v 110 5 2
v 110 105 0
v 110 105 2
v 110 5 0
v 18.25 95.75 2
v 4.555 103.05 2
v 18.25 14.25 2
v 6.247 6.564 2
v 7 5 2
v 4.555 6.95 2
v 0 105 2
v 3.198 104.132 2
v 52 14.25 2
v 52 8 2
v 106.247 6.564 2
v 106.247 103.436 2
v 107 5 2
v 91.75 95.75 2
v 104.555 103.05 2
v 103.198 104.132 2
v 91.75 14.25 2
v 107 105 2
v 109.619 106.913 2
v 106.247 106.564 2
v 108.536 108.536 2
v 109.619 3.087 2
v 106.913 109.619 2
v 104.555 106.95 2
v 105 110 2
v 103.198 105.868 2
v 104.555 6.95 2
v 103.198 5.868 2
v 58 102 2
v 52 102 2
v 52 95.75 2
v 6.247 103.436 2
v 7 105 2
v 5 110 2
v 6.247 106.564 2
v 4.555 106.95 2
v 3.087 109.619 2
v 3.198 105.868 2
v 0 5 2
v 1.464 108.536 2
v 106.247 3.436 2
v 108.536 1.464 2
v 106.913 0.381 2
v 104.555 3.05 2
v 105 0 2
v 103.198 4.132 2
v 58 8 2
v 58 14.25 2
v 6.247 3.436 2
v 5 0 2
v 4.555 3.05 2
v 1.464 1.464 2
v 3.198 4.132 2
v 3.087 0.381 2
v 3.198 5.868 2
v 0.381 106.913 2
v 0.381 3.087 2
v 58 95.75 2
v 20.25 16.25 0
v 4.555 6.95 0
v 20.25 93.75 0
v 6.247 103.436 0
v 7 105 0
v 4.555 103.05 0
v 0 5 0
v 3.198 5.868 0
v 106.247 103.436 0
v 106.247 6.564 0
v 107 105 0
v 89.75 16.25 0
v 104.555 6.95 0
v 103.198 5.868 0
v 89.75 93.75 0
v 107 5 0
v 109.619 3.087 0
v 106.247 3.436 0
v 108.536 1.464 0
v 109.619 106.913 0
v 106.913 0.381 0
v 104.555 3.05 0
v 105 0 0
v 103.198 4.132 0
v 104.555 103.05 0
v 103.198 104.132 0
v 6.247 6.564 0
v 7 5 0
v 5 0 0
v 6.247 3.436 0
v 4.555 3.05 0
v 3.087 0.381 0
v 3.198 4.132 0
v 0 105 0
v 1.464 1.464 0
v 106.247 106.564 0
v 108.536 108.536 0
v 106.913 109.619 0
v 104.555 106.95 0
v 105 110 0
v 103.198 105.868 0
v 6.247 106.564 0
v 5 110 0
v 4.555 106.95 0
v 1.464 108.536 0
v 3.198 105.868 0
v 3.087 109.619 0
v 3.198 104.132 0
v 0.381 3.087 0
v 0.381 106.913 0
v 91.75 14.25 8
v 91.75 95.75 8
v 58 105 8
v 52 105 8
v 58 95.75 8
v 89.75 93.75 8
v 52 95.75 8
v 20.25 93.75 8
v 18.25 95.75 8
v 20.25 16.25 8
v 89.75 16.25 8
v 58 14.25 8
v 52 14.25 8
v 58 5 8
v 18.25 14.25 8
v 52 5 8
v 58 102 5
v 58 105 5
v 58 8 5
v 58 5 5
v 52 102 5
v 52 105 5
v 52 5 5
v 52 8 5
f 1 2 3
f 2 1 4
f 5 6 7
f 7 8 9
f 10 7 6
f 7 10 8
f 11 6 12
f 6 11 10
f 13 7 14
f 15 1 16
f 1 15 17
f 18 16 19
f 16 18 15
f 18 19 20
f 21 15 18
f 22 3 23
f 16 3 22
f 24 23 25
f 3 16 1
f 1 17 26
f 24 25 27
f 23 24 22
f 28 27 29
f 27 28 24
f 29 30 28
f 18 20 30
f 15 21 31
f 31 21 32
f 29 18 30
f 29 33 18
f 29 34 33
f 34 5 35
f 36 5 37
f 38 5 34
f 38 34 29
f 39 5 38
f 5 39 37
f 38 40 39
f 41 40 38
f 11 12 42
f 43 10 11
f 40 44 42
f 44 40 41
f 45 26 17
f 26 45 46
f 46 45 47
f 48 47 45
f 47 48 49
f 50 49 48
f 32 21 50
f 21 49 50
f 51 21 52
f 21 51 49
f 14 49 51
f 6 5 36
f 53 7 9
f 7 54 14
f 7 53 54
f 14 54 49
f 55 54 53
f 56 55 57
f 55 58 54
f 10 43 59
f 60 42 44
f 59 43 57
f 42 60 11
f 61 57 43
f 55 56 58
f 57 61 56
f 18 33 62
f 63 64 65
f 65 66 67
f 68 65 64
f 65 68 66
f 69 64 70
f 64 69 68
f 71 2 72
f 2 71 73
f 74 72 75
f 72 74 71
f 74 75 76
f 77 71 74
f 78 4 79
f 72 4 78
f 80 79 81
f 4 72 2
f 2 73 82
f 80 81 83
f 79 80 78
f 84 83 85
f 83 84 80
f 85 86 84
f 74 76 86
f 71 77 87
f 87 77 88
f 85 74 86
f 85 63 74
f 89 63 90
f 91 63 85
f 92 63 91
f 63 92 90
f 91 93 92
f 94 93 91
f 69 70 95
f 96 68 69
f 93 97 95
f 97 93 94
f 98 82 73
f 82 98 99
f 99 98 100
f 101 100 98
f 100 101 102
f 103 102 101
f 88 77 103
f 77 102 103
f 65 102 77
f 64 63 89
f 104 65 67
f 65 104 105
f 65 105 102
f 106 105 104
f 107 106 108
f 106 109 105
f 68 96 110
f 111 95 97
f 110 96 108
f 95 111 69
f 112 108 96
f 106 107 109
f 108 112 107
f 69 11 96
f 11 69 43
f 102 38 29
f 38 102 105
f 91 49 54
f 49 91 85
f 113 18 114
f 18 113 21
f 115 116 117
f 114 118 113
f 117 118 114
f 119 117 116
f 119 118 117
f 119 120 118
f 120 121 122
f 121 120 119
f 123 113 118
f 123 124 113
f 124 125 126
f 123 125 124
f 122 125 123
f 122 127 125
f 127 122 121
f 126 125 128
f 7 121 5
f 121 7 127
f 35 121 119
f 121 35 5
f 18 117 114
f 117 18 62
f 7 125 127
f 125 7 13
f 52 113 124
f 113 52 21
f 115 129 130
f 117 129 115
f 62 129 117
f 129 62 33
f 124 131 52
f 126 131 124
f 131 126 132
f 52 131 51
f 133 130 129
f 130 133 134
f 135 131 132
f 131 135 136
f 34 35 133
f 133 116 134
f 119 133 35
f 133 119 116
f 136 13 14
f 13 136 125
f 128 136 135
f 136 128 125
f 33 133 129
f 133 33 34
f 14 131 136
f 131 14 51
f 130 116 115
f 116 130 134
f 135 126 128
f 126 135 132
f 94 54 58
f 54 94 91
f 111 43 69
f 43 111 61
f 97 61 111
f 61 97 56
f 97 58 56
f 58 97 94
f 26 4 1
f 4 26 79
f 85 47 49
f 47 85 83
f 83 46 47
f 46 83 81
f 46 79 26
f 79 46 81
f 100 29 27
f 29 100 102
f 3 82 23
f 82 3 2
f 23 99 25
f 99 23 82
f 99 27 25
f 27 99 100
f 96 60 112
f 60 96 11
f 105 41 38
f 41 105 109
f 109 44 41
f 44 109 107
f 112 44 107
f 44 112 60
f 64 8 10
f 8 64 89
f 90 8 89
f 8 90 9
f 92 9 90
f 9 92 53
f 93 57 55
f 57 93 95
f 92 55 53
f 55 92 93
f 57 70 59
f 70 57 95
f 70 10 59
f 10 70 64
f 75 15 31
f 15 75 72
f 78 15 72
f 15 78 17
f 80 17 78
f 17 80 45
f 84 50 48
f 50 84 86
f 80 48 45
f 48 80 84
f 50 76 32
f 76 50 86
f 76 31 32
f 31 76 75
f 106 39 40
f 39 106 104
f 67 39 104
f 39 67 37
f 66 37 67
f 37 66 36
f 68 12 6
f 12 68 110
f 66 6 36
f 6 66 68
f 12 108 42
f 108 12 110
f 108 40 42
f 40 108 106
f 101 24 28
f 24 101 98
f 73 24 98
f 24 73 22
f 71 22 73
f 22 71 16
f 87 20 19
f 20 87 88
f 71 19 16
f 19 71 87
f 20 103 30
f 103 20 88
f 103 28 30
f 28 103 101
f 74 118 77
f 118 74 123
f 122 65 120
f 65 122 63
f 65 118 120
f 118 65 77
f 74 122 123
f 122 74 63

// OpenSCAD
wall_strength = 2;
adapter_width = 110;
adapter_length = 110;

cooler_width = 69.5; // nice
cooler_length = 77.5;

corner_radius = 5;
screw_hole_radius = 2;

inner_hook_distance = 94;
hook_width = 6;
outer_hook_distance = 100;

fence_height = 8;

// the whole project consists of two big unions.
// one is all the positives. Base plate, fence and hooks
// the other are the negatives for the big hole in the middle,
// the bore holes and the rounded corners

// change this to union to see how this is build
difference() {
    // positives
    union () {
        // base plate
        cube([
            adapter_length,
            adapter_width,
            wall_strength
        ]);
        translate([
            (adapter_width - cooler_width - 2 * wall_strength) / 2,
            (adapter_length - cooler_length - 2 * wall_strength) / 2,
            0]) {
            
            // fence
            cube([
                cooler_width + 2 * wall_strength, 
                cooler_length + 2 * wall_strength, 
                fence_height
            ]);
        }
        //hook lower part
        translate([
            (adapter_length - hook_width) / 2,
            (adapter_width - inner_hook_distance) / 2,
            0]) {
            color("#ff0000") 
            cube([
                hook_width, 
                inner_hook_distance, 
                3 + wall_strength
            ]);
        }

        // hook upper part
        translate([
            (adapter_length - hook_width) / 2,
            (adapter_width - outer_hook_distance) / 2,
            3 + wall_strength]) {
            color("#ff0000") 
            cube([
                hook_width, 
                outer_hook_distance, 
                3
            ]);
        }
    }
    // positives
    union() {
        // every corner is basically a cube with a quarter-cylindrical cutout
        // which is then used to subtract from a base plate and get a nice round corner
        // TODO: Find if there's some better way to do this.
        translate([-1 * corner_radius ,-1 * corner_radius ,-1 * corner_radius ]) {
            difference () {
                cube ([
                    2 * corner_radius,
                    2 * corner_radius,
                    2 * corner_radius
                ]);
                translate([2 * corner_radius,2 * corner_radius,0]) {
                    cylinder(30,corner_radius,corner_radius);
                }
            }
        }
        translate([
                (corner_radius) + adapter_width ,
                (-1 * corner_radius),
                (-1 * corner_radius) 
                ]) {
            rotate(a = 90, v=[0,0,10]) {
                difference () {
                    cube ([
                        2 * corner_radius,
                        2 * corner_radius,
                        2 * corner_radius
                    ]);
                    translate([2 * corner_radius,2 * corner_radius,0]) {
                        cylinder(30,corner_radius,corner_radius);
                    }
                }
            }
        }
        translate([
                (corner_radius) + adapter_length ,
                (corner_radius) + adapter_width ,
                (-1 * corner_radius) 
                ]) {
            rotate(a = 180, v=[0,0,10]) {
                difference () {
                    cube ([
                        2 * corner_radius,
                        2 * corner_radius,
                        2 * corner_radius
                    ]);
                    translate([2 * corner_radius,2 * corner_radius,0]) {
                        cylinder(30,corner_radius,corner_radius);
                    }
                }
            }
        }

        translate([
                (-1 * corner_radius),
                (corner_radius) + adapter_width ,
                (-1 * corner_radius) 
                ]) {
            rotate(a = 270, v=[0,0,10]) {
                difference () {
                    cube ([
                        2 * corner_radius,
                        2 * corner_radius,
                        2 * corner_radius
                    ]);
                    translate([2 * corner_radius,2 * corner_radius,0]) {
                        cylinder(30,corner_radius,corner_radius);
                    }
                }
            }
        }

        
        // every screw hole is just a cylinder subtracted from base plate
        translate([5,5,0]) {
            cylinder(30,screw_hole_radius,screw_hole_radius,true);
        }
        translate([105,5,0]) {
            cylinder(30,screw_hole_radius,screw_hole_radius,true);
        }
        translate([5,105,0]) {
            cylinder(30,screw_hole_radius,screw_hole_radius,true);
        }
        translate([105,105,0]) {
            cylinder(30,screw_hole_radius,screw_hole_radius,true);
        }

        // the final space in the middle is a cube cutout
        translate([
            (adapter_width - cooler_width) / 2,
            (adapter_length - cooler_length) / 2,
            -30]) {
            color("#ff9900") cube([cooler_width, cooler_length, 60]);
        }
    }
}
